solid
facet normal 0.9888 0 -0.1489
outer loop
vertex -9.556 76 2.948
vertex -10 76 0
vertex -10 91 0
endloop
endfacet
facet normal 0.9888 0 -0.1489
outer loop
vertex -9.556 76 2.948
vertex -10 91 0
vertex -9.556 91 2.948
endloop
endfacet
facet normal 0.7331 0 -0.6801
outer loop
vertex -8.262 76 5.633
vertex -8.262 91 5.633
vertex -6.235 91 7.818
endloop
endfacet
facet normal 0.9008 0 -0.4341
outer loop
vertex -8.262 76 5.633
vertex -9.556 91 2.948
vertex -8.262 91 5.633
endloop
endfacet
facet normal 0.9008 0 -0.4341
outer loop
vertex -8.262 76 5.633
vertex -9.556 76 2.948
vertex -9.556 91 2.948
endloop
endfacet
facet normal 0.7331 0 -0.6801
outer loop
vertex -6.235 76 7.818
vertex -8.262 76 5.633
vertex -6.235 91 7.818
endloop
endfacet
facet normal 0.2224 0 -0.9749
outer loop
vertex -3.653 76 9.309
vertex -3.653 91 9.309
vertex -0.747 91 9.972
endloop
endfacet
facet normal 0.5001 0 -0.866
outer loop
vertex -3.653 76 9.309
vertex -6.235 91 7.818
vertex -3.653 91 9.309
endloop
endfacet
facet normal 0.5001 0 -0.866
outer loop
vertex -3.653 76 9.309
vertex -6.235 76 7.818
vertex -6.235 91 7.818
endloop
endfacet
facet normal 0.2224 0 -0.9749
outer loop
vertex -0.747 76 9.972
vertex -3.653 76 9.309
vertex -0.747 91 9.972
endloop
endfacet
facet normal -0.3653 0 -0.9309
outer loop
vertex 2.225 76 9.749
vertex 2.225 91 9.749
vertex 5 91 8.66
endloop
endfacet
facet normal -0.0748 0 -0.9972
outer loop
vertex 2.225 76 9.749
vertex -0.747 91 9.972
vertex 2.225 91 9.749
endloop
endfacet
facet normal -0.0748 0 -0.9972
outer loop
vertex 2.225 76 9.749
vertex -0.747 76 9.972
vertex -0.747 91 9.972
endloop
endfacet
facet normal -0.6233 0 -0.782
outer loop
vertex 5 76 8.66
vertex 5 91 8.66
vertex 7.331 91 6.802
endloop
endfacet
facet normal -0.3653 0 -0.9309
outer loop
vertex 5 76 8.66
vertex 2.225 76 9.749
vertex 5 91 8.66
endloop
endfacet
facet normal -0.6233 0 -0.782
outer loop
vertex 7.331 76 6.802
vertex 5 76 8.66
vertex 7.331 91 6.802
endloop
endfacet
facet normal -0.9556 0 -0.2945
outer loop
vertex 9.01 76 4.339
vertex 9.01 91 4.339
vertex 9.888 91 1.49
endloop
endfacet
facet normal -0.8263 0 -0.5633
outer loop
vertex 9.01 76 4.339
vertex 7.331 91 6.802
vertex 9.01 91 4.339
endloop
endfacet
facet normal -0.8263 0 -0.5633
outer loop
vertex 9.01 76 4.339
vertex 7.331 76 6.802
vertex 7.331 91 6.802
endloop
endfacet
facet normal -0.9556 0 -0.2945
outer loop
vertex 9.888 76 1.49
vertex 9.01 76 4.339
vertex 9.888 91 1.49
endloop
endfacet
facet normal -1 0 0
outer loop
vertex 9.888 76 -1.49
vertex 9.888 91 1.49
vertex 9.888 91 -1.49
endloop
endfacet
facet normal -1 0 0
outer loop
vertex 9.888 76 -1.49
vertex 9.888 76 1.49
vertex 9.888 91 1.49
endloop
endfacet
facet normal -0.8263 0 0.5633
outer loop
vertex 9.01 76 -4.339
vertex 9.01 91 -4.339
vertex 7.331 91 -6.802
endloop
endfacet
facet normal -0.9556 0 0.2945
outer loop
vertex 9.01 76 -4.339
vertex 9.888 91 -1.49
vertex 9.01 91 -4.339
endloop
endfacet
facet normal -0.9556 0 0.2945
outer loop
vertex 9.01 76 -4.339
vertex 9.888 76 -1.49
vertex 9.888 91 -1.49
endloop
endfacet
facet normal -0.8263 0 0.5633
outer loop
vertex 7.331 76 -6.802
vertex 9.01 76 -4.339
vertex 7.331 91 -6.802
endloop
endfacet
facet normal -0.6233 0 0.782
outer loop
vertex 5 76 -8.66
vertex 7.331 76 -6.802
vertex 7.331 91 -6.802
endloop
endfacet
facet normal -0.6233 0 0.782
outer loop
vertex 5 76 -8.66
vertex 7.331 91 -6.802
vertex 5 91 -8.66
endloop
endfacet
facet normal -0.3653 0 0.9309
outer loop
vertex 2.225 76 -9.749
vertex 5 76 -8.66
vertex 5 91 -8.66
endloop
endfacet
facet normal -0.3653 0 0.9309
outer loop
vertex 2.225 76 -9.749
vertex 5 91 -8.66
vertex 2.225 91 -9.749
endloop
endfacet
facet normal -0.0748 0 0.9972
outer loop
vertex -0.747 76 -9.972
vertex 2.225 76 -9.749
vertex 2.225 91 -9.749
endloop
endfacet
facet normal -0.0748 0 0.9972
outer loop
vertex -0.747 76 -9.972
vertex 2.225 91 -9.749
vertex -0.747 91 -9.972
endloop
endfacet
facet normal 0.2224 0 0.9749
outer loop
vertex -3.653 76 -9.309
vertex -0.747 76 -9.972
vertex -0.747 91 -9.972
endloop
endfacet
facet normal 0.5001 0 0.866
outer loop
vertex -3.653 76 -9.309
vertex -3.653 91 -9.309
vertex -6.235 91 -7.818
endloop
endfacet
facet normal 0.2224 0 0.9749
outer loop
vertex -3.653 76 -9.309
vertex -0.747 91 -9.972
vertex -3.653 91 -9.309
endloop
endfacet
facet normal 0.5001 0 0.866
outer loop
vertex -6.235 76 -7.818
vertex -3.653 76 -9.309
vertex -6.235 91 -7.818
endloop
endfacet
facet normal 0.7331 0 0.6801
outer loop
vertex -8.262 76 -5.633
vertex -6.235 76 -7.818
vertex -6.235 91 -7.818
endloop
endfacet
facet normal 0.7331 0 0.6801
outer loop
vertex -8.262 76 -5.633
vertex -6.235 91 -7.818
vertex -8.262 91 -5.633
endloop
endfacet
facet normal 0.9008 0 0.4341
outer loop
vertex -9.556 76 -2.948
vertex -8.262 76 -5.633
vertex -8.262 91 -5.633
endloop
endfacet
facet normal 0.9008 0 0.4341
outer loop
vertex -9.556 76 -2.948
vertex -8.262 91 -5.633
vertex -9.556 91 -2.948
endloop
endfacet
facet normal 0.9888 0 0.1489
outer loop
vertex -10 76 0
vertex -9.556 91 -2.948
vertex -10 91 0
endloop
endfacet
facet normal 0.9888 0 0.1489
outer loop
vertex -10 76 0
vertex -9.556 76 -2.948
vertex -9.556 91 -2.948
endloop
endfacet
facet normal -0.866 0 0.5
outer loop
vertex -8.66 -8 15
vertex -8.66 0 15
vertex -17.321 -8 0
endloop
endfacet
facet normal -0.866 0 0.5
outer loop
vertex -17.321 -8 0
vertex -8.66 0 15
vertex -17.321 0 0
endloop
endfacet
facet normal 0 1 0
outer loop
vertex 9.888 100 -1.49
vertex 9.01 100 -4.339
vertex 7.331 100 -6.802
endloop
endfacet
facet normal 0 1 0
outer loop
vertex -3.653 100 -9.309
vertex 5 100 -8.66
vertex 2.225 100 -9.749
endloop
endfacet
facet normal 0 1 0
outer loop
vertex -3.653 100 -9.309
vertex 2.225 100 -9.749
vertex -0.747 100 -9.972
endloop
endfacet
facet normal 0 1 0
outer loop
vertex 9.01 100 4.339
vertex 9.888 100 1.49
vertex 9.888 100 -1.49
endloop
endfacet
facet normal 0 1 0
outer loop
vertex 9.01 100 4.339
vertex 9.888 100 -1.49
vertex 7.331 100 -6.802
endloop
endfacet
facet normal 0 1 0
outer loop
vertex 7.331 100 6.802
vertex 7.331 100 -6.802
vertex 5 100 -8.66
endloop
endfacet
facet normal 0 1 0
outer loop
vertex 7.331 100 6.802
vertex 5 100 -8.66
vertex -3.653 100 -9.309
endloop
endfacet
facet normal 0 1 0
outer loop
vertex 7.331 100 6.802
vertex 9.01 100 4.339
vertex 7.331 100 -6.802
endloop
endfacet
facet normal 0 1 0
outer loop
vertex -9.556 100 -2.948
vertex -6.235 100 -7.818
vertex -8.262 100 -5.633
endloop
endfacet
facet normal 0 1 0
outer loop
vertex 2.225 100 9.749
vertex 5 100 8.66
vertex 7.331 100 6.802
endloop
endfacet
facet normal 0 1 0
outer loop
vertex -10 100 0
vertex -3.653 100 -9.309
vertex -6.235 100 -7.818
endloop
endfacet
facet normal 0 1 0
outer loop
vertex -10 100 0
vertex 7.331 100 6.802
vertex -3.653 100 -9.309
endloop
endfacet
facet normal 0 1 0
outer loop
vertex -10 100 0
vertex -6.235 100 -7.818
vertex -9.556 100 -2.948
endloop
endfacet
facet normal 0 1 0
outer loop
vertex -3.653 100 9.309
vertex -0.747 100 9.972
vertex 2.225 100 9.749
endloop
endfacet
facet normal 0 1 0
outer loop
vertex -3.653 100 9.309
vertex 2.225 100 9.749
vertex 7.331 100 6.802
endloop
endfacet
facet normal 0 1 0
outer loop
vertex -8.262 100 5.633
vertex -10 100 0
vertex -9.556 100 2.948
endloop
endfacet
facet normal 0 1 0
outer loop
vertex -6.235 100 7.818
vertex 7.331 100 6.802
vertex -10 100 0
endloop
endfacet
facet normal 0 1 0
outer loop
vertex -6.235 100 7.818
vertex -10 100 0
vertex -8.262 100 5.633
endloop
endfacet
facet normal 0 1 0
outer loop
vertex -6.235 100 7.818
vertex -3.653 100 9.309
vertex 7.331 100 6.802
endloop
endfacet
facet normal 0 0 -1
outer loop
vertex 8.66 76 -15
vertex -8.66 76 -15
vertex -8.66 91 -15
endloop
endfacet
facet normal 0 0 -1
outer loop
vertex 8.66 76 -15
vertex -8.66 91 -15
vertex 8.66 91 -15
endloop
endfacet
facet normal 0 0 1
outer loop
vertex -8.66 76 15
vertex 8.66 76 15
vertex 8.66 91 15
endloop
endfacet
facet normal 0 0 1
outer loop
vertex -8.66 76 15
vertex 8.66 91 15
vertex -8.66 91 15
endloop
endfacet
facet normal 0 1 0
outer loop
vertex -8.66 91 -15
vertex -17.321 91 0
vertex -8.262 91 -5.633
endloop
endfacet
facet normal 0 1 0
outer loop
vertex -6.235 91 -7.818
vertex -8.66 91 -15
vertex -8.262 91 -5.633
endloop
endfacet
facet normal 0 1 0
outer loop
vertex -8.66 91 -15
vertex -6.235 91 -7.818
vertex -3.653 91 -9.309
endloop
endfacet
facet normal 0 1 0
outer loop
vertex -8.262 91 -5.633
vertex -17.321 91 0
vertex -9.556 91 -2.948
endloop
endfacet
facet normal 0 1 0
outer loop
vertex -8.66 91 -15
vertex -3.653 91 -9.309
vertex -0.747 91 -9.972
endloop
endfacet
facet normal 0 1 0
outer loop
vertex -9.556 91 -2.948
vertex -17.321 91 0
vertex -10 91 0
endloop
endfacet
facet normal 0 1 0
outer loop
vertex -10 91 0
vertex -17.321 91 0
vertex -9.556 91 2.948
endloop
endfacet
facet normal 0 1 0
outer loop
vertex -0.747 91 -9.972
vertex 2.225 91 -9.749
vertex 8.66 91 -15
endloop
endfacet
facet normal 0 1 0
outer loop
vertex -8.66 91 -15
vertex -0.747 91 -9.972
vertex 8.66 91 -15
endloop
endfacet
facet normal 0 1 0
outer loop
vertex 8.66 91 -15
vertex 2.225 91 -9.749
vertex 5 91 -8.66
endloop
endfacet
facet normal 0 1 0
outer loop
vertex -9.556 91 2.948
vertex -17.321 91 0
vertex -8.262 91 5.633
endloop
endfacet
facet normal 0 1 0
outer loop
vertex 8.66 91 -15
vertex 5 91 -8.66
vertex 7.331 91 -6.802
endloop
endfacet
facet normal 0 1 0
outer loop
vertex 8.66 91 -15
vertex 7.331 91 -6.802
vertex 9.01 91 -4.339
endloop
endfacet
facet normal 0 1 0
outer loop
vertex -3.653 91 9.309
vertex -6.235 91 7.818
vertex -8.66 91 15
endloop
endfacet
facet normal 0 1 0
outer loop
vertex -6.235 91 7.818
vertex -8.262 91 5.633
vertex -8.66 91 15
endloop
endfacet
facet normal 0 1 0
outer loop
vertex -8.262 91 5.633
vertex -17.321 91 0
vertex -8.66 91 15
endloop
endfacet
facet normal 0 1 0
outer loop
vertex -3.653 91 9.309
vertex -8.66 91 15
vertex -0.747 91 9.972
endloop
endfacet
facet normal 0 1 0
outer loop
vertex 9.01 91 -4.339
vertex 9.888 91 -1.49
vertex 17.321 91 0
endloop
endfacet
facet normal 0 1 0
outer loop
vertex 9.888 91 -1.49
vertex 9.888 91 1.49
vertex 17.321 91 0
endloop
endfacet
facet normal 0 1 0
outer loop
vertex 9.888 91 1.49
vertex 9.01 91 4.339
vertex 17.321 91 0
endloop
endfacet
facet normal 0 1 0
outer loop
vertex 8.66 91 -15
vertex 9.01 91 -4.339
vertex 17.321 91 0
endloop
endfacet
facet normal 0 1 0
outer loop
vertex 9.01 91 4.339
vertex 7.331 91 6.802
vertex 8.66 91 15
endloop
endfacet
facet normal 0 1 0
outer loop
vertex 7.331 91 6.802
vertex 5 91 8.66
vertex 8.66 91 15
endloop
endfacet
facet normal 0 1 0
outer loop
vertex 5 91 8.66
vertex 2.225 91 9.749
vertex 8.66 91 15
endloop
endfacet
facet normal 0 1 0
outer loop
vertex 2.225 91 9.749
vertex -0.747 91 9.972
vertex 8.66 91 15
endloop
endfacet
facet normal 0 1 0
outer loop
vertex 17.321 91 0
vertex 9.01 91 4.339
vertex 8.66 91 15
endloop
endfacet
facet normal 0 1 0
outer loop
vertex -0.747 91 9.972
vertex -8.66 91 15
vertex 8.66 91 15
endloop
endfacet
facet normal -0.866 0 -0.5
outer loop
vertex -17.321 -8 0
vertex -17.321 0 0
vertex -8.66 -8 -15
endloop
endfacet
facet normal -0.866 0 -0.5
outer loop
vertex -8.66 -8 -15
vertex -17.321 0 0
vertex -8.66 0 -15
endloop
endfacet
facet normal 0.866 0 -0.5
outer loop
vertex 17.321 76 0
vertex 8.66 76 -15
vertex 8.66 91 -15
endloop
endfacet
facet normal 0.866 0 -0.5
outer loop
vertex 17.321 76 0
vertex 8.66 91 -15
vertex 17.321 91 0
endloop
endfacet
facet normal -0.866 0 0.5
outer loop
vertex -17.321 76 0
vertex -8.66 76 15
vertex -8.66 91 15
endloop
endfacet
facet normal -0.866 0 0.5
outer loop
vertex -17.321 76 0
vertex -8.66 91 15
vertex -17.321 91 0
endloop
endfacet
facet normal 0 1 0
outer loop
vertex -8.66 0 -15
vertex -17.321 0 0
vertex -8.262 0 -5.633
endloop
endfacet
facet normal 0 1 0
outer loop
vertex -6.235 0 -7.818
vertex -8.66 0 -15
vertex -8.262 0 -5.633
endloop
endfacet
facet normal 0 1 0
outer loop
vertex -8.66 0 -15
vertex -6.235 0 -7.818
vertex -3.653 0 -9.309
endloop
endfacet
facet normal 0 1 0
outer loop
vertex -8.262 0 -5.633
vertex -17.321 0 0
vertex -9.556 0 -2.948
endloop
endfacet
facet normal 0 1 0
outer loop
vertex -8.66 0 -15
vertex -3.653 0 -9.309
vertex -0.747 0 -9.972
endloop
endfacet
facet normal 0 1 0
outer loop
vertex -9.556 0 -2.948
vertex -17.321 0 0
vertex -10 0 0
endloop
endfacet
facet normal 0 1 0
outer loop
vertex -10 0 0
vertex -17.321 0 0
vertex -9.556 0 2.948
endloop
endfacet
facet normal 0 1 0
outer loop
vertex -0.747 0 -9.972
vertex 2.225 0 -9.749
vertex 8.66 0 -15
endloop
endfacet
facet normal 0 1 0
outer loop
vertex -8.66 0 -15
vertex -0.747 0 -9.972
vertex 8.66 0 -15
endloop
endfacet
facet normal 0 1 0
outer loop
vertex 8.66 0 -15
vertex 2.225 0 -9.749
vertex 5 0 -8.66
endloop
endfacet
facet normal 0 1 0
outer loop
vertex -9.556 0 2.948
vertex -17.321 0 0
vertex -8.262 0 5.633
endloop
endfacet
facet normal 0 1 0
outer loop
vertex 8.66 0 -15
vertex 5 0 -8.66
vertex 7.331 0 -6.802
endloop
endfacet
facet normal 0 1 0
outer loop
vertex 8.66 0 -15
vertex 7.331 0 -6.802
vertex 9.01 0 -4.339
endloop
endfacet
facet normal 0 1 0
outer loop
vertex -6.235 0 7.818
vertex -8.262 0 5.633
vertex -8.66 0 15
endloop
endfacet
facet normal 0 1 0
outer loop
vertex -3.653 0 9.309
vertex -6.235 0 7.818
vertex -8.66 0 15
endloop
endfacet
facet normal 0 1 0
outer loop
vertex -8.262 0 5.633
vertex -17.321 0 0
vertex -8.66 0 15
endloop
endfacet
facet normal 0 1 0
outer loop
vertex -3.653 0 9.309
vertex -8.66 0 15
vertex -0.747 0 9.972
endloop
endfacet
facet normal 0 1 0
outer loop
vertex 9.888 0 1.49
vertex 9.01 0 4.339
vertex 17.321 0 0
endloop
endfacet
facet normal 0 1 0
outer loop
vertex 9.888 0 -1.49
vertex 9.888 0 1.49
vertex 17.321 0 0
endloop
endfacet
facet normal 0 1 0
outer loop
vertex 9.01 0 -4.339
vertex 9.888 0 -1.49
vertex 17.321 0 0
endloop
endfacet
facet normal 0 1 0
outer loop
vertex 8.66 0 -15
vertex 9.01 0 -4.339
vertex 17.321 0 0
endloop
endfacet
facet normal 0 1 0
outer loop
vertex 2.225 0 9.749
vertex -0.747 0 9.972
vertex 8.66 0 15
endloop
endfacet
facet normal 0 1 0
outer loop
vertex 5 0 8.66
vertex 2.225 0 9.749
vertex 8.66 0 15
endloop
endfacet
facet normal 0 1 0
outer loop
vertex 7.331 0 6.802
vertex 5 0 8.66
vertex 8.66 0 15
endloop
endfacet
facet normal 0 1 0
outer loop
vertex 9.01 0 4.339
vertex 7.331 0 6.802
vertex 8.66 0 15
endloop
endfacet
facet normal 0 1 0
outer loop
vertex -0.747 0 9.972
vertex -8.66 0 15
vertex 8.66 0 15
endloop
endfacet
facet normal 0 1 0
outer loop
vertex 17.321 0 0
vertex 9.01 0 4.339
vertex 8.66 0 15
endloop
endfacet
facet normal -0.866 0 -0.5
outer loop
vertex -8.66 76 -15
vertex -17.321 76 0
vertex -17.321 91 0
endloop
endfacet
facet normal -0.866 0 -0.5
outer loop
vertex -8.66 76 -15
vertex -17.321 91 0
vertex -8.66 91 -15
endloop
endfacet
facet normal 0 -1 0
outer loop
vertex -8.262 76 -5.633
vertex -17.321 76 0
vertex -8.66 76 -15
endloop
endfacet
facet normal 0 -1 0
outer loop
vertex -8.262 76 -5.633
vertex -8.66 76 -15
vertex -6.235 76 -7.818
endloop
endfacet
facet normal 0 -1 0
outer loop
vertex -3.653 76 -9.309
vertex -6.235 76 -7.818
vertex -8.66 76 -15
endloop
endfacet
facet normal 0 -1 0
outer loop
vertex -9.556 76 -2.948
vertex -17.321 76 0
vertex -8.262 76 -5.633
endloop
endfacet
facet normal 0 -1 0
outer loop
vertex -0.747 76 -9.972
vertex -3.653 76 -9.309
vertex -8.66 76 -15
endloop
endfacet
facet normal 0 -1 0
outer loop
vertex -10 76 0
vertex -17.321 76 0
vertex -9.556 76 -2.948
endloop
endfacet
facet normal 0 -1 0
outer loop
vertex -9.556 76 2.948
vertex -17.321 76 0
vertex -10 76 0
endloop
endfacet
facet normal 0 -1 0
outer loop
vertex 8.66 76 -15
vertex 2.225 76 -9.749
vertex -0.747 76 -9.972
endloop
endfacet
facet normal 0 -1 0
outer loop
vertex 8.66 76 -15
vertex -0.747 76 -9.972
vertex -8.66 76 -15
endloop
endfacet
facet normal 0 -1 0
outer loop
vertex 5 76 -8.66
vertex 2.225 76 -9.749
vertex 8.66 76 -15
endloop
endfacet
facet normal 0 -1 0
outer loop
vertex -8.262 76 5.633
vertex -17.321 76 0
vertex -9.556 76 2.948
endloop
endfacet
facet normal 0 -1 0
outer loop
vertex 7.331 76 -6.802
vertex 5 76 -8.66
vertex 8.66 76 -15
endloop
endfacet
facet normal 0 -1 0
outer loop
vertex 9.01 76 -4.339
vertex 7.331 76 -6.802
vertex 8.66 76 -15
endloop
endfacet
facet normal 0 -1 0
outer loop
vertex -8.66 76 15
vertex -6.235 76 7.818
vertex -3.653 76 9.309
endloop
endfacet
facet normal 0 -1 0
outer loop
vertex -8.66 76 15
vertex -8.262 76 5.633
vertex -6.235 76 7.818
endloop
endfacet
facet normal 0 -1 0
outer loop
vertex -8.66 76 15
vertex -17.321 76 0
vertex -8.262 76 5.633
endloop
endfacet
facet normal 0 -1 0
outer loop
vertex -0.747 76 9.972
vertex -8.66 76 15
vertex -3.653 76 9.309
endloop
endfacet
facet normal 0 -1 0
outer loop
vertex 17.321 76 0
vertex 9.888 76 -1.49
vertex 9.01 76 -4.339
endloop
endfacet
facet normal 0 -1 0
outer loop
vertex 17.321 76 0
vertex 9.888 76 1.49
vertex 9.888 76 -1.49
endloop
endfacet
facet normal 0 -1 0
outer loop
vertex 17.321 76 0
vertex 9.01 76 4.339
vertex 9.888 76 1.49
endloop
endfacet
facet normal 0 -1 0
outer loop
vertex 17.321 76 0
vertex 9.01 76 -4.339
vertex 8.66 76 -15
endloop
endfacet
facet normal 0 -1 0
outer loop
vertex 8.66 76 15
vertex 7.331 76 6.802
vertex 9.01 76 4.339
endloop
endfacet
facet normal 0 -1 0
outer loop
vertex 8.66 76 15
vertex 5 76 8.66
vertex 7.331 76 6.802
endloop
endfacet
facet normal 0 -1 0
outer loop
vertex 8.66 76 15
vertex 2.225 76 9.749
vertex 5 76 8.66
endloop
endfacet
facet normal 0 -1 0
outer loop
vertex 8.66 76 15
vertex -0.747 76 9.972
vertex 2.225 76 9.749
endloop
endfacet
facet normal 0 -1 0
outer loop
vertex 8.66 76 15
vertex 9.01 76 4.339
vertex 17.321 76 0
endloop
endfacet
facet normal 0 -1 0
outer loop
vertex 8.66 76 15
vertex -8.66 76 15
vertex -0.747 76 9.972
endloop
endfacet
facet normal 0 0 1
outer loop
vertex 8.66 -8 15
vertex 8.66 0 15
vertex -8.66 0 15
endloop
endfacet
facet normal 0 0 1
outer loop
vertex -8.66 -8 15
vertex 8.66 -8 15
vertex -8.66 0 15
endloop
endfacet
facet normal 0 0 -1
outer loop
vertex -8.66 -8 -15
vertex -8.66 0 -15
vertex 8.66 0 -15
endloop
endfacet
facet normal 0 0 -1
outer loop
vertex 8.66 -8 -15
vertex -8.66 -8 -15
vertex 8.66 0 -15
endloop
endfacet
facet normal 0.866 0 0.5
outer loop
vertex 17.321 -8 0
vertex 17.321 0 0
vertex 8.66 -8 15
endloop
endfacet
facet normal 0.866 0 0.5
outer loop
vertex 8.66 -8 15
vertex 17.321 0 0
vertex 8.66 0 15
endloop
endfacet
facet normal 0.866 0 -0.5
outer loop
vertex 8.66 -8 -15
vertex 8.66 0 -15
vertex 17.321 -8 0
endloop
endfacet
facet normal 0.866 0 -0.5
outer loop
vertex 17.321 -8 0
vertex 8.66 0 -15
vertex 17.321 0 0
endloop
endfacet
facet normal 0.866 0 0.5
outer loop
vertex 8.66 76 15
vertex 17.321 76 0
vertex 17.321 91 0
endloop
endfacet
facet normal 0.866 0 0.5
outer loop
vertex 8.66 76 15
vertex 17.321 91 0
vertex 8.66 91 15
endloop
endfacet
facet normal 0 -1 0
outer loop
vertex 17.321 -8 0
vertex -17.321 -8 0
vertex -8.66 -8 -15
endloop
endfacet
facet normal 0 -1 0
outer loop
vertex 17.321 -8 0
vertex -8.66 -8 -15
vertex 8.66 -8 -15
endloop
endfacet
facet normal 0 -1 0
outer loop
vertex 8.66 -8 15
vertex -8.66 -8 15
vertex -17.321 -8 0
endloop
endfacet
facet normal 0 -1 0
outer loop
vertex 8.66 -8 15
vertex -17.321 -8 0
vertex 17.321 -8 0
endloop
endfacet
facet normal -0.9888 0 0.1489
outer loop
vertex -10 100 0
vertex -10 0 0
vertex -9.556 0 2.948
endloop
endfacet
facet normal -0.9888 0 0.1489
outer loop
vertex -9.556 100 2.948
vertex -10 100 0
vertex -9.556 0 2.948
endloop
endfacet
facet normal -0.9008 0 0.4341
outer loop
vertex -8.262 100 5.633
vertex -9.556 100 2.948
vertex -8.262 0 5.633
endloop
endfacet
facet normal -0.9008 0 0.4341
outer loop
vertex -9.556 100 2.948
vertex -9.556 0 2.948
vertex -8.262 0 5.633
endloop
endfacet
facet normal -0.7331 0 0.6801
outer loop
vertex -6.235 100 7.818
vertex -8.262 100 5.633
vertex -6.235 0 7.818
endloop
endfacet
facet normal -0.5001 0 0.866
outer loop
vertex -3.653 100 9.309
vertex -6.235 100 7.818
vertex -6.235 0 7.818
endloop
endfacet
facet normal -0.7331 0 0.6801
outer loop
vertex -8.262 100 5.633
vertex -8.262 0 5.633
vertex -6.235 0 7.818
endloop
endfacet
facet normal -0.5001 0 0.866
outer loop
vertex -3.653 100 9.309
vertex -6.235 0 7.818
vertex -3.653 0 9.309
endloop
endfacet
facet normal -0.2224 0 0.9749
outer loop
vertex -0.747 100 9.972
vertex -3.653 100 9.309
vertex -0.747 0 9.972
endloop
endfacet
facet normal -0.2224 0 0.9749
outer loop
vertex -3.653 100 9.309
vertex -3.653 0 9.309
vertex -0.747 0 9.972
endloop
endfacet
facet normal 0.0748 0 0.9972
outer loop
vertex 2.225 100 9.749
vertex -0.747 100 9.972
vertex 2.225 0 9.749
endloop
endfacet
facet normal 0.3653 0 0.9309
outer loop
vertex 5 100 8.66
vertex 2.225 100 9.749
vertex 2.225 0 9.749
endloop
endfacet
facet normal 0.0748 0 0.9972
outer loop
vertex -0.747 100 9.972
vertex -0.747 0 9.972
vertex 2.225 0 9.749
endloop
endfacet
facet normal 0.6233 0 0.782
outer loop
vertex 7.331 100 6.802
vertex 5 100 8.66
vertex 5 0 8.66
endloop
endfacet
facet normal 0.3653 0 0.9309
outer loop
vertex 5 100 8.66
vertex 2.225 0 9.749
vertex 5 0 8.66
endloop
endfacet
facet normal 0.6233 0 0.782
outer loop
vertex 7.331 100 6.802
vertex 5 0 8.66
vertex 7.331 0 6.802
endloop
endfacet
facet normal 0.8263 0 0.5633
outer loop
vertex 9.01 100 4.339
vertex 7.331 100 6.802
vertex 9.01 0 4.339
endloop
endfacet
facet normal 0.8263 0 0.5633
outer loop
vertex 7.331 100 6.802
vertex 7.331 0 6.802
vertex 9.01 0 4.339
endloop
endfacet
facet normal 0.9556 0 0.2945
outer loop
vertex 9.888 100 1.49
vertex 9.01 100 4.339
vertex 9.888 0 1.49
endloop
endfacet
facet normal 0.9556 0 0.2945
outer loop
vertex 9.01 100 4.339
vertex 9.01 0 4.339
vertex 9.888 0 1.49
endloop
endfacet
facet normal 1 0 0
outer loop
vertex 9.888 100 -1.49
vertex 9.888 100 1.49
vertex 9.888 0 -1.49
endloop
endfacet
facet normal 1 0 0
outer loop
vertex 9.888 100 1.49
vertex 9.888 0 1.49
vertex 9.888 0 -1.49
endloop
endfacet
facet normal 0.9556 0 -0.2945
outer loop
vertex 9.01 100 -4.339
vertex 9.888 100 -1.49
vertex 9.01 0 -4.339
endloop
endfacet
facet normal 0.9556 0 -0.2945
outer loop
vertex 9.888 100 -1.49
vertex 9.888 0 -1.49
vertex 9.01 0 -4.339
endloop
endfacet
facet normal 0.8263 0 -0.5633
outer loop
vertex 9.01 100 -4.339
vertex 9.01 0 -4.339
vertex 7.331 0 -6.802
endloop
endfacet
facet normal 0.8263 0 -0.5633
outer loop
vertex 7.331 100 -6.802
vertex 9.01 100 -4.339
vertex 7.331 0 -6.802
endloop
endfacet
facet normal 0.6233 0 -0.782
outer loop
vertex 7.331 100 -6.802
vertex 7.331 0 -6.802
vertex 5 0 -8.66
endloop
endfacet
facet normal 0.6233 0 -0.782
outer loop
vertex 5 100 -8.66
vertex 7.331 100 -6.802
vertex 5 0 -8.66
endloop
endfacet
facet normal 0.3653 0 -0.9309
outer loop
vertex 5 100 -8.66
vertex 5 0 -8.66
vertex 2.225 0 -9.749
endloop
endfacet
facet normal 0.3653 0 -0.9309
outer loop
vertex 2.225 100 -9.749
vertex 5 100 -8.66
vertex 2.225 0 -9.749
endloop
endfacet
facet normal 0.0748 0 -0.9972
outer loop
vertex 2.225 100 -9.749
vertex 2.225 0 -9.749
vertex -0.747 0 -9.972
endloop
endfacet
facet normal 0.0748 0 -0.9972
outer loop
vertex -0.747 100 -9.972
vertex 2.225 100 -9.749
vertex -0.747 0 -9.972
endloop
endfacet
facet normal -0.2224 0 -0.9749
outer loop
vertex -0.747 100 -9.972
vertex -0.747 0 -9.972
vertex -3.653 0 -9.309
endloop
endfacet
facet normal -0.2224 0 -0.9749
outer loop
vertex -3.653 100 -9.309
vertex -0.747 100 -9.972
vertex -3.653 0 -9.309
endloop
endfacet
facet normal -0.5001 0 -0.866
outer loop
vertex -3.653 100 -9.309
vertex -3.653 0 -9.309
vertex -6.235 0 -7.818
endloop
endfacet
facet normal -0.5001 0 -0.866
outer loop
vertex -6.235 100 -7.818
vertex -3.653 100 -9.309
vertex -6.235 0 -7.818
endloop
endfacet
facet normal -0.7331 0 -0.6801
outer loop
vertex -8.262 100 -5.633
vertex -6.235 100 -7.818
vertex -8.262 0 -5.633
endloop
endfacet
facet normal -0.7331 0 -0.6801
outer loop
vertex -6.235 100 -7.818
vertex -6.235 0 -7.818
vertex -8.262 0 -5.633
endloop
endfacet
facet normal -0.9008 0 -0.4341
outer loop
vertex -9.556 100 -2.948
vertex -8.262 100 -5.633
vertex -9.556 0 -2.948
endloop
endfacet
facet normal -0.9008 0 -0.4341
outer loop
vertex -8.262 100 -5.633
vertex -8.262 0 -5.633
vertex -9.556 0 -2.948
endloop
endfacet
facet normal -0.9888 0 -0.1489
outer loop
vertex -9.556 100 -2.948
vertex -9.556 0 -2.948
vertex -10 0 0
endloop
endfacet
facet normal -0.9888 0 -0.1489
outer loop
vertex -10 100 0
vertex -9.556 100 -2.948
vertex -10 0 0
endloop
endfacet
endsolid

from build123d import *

# Parameters (mm, degrees)
F1_DEPTH = 8
F2_R     = 10
F3_DEPTH = 100
F6_DEPTH = 15


with BuildPart() as f1:
    # F0 (on Front) → F1 (new body)
    with BuildSketch(Plane.XZ):
        Polygon((17.320508, 0), (8.660254, 15), (-8.660254, 15), (-17.320508, 0), (-8.660254, -15), (8.660254, -15), align=None)
    extrude(amount=F1_DEPTH)

    # F2 (on face) → F3 (join)
    with BuildSketch(Plane(origin=(0, 0, 0), x_dir=(-1, 0, 0), z_dir=(0, 1, 0))):
        Circle(F2_R)
    extrude(amount=F3_DEPTH)


with BuildPart() as f6:
    # F5 (on offset) → F6 (new body)
    with BuildSketch(Plane.XZ.offset(-76)):
        Polygon((-17.320508, 0), (-8.660254, -15), (8.660254, -15), (17.320508, 0), (8.660254, 15), (-8.660254, 15), align=None)
    extrude(amount=-F6_DEPTH)

    # F7: cut F1
    add(f1.part, mode=Mode.SUBTRACT)


solid = Compound([f1.part, f6.part])
